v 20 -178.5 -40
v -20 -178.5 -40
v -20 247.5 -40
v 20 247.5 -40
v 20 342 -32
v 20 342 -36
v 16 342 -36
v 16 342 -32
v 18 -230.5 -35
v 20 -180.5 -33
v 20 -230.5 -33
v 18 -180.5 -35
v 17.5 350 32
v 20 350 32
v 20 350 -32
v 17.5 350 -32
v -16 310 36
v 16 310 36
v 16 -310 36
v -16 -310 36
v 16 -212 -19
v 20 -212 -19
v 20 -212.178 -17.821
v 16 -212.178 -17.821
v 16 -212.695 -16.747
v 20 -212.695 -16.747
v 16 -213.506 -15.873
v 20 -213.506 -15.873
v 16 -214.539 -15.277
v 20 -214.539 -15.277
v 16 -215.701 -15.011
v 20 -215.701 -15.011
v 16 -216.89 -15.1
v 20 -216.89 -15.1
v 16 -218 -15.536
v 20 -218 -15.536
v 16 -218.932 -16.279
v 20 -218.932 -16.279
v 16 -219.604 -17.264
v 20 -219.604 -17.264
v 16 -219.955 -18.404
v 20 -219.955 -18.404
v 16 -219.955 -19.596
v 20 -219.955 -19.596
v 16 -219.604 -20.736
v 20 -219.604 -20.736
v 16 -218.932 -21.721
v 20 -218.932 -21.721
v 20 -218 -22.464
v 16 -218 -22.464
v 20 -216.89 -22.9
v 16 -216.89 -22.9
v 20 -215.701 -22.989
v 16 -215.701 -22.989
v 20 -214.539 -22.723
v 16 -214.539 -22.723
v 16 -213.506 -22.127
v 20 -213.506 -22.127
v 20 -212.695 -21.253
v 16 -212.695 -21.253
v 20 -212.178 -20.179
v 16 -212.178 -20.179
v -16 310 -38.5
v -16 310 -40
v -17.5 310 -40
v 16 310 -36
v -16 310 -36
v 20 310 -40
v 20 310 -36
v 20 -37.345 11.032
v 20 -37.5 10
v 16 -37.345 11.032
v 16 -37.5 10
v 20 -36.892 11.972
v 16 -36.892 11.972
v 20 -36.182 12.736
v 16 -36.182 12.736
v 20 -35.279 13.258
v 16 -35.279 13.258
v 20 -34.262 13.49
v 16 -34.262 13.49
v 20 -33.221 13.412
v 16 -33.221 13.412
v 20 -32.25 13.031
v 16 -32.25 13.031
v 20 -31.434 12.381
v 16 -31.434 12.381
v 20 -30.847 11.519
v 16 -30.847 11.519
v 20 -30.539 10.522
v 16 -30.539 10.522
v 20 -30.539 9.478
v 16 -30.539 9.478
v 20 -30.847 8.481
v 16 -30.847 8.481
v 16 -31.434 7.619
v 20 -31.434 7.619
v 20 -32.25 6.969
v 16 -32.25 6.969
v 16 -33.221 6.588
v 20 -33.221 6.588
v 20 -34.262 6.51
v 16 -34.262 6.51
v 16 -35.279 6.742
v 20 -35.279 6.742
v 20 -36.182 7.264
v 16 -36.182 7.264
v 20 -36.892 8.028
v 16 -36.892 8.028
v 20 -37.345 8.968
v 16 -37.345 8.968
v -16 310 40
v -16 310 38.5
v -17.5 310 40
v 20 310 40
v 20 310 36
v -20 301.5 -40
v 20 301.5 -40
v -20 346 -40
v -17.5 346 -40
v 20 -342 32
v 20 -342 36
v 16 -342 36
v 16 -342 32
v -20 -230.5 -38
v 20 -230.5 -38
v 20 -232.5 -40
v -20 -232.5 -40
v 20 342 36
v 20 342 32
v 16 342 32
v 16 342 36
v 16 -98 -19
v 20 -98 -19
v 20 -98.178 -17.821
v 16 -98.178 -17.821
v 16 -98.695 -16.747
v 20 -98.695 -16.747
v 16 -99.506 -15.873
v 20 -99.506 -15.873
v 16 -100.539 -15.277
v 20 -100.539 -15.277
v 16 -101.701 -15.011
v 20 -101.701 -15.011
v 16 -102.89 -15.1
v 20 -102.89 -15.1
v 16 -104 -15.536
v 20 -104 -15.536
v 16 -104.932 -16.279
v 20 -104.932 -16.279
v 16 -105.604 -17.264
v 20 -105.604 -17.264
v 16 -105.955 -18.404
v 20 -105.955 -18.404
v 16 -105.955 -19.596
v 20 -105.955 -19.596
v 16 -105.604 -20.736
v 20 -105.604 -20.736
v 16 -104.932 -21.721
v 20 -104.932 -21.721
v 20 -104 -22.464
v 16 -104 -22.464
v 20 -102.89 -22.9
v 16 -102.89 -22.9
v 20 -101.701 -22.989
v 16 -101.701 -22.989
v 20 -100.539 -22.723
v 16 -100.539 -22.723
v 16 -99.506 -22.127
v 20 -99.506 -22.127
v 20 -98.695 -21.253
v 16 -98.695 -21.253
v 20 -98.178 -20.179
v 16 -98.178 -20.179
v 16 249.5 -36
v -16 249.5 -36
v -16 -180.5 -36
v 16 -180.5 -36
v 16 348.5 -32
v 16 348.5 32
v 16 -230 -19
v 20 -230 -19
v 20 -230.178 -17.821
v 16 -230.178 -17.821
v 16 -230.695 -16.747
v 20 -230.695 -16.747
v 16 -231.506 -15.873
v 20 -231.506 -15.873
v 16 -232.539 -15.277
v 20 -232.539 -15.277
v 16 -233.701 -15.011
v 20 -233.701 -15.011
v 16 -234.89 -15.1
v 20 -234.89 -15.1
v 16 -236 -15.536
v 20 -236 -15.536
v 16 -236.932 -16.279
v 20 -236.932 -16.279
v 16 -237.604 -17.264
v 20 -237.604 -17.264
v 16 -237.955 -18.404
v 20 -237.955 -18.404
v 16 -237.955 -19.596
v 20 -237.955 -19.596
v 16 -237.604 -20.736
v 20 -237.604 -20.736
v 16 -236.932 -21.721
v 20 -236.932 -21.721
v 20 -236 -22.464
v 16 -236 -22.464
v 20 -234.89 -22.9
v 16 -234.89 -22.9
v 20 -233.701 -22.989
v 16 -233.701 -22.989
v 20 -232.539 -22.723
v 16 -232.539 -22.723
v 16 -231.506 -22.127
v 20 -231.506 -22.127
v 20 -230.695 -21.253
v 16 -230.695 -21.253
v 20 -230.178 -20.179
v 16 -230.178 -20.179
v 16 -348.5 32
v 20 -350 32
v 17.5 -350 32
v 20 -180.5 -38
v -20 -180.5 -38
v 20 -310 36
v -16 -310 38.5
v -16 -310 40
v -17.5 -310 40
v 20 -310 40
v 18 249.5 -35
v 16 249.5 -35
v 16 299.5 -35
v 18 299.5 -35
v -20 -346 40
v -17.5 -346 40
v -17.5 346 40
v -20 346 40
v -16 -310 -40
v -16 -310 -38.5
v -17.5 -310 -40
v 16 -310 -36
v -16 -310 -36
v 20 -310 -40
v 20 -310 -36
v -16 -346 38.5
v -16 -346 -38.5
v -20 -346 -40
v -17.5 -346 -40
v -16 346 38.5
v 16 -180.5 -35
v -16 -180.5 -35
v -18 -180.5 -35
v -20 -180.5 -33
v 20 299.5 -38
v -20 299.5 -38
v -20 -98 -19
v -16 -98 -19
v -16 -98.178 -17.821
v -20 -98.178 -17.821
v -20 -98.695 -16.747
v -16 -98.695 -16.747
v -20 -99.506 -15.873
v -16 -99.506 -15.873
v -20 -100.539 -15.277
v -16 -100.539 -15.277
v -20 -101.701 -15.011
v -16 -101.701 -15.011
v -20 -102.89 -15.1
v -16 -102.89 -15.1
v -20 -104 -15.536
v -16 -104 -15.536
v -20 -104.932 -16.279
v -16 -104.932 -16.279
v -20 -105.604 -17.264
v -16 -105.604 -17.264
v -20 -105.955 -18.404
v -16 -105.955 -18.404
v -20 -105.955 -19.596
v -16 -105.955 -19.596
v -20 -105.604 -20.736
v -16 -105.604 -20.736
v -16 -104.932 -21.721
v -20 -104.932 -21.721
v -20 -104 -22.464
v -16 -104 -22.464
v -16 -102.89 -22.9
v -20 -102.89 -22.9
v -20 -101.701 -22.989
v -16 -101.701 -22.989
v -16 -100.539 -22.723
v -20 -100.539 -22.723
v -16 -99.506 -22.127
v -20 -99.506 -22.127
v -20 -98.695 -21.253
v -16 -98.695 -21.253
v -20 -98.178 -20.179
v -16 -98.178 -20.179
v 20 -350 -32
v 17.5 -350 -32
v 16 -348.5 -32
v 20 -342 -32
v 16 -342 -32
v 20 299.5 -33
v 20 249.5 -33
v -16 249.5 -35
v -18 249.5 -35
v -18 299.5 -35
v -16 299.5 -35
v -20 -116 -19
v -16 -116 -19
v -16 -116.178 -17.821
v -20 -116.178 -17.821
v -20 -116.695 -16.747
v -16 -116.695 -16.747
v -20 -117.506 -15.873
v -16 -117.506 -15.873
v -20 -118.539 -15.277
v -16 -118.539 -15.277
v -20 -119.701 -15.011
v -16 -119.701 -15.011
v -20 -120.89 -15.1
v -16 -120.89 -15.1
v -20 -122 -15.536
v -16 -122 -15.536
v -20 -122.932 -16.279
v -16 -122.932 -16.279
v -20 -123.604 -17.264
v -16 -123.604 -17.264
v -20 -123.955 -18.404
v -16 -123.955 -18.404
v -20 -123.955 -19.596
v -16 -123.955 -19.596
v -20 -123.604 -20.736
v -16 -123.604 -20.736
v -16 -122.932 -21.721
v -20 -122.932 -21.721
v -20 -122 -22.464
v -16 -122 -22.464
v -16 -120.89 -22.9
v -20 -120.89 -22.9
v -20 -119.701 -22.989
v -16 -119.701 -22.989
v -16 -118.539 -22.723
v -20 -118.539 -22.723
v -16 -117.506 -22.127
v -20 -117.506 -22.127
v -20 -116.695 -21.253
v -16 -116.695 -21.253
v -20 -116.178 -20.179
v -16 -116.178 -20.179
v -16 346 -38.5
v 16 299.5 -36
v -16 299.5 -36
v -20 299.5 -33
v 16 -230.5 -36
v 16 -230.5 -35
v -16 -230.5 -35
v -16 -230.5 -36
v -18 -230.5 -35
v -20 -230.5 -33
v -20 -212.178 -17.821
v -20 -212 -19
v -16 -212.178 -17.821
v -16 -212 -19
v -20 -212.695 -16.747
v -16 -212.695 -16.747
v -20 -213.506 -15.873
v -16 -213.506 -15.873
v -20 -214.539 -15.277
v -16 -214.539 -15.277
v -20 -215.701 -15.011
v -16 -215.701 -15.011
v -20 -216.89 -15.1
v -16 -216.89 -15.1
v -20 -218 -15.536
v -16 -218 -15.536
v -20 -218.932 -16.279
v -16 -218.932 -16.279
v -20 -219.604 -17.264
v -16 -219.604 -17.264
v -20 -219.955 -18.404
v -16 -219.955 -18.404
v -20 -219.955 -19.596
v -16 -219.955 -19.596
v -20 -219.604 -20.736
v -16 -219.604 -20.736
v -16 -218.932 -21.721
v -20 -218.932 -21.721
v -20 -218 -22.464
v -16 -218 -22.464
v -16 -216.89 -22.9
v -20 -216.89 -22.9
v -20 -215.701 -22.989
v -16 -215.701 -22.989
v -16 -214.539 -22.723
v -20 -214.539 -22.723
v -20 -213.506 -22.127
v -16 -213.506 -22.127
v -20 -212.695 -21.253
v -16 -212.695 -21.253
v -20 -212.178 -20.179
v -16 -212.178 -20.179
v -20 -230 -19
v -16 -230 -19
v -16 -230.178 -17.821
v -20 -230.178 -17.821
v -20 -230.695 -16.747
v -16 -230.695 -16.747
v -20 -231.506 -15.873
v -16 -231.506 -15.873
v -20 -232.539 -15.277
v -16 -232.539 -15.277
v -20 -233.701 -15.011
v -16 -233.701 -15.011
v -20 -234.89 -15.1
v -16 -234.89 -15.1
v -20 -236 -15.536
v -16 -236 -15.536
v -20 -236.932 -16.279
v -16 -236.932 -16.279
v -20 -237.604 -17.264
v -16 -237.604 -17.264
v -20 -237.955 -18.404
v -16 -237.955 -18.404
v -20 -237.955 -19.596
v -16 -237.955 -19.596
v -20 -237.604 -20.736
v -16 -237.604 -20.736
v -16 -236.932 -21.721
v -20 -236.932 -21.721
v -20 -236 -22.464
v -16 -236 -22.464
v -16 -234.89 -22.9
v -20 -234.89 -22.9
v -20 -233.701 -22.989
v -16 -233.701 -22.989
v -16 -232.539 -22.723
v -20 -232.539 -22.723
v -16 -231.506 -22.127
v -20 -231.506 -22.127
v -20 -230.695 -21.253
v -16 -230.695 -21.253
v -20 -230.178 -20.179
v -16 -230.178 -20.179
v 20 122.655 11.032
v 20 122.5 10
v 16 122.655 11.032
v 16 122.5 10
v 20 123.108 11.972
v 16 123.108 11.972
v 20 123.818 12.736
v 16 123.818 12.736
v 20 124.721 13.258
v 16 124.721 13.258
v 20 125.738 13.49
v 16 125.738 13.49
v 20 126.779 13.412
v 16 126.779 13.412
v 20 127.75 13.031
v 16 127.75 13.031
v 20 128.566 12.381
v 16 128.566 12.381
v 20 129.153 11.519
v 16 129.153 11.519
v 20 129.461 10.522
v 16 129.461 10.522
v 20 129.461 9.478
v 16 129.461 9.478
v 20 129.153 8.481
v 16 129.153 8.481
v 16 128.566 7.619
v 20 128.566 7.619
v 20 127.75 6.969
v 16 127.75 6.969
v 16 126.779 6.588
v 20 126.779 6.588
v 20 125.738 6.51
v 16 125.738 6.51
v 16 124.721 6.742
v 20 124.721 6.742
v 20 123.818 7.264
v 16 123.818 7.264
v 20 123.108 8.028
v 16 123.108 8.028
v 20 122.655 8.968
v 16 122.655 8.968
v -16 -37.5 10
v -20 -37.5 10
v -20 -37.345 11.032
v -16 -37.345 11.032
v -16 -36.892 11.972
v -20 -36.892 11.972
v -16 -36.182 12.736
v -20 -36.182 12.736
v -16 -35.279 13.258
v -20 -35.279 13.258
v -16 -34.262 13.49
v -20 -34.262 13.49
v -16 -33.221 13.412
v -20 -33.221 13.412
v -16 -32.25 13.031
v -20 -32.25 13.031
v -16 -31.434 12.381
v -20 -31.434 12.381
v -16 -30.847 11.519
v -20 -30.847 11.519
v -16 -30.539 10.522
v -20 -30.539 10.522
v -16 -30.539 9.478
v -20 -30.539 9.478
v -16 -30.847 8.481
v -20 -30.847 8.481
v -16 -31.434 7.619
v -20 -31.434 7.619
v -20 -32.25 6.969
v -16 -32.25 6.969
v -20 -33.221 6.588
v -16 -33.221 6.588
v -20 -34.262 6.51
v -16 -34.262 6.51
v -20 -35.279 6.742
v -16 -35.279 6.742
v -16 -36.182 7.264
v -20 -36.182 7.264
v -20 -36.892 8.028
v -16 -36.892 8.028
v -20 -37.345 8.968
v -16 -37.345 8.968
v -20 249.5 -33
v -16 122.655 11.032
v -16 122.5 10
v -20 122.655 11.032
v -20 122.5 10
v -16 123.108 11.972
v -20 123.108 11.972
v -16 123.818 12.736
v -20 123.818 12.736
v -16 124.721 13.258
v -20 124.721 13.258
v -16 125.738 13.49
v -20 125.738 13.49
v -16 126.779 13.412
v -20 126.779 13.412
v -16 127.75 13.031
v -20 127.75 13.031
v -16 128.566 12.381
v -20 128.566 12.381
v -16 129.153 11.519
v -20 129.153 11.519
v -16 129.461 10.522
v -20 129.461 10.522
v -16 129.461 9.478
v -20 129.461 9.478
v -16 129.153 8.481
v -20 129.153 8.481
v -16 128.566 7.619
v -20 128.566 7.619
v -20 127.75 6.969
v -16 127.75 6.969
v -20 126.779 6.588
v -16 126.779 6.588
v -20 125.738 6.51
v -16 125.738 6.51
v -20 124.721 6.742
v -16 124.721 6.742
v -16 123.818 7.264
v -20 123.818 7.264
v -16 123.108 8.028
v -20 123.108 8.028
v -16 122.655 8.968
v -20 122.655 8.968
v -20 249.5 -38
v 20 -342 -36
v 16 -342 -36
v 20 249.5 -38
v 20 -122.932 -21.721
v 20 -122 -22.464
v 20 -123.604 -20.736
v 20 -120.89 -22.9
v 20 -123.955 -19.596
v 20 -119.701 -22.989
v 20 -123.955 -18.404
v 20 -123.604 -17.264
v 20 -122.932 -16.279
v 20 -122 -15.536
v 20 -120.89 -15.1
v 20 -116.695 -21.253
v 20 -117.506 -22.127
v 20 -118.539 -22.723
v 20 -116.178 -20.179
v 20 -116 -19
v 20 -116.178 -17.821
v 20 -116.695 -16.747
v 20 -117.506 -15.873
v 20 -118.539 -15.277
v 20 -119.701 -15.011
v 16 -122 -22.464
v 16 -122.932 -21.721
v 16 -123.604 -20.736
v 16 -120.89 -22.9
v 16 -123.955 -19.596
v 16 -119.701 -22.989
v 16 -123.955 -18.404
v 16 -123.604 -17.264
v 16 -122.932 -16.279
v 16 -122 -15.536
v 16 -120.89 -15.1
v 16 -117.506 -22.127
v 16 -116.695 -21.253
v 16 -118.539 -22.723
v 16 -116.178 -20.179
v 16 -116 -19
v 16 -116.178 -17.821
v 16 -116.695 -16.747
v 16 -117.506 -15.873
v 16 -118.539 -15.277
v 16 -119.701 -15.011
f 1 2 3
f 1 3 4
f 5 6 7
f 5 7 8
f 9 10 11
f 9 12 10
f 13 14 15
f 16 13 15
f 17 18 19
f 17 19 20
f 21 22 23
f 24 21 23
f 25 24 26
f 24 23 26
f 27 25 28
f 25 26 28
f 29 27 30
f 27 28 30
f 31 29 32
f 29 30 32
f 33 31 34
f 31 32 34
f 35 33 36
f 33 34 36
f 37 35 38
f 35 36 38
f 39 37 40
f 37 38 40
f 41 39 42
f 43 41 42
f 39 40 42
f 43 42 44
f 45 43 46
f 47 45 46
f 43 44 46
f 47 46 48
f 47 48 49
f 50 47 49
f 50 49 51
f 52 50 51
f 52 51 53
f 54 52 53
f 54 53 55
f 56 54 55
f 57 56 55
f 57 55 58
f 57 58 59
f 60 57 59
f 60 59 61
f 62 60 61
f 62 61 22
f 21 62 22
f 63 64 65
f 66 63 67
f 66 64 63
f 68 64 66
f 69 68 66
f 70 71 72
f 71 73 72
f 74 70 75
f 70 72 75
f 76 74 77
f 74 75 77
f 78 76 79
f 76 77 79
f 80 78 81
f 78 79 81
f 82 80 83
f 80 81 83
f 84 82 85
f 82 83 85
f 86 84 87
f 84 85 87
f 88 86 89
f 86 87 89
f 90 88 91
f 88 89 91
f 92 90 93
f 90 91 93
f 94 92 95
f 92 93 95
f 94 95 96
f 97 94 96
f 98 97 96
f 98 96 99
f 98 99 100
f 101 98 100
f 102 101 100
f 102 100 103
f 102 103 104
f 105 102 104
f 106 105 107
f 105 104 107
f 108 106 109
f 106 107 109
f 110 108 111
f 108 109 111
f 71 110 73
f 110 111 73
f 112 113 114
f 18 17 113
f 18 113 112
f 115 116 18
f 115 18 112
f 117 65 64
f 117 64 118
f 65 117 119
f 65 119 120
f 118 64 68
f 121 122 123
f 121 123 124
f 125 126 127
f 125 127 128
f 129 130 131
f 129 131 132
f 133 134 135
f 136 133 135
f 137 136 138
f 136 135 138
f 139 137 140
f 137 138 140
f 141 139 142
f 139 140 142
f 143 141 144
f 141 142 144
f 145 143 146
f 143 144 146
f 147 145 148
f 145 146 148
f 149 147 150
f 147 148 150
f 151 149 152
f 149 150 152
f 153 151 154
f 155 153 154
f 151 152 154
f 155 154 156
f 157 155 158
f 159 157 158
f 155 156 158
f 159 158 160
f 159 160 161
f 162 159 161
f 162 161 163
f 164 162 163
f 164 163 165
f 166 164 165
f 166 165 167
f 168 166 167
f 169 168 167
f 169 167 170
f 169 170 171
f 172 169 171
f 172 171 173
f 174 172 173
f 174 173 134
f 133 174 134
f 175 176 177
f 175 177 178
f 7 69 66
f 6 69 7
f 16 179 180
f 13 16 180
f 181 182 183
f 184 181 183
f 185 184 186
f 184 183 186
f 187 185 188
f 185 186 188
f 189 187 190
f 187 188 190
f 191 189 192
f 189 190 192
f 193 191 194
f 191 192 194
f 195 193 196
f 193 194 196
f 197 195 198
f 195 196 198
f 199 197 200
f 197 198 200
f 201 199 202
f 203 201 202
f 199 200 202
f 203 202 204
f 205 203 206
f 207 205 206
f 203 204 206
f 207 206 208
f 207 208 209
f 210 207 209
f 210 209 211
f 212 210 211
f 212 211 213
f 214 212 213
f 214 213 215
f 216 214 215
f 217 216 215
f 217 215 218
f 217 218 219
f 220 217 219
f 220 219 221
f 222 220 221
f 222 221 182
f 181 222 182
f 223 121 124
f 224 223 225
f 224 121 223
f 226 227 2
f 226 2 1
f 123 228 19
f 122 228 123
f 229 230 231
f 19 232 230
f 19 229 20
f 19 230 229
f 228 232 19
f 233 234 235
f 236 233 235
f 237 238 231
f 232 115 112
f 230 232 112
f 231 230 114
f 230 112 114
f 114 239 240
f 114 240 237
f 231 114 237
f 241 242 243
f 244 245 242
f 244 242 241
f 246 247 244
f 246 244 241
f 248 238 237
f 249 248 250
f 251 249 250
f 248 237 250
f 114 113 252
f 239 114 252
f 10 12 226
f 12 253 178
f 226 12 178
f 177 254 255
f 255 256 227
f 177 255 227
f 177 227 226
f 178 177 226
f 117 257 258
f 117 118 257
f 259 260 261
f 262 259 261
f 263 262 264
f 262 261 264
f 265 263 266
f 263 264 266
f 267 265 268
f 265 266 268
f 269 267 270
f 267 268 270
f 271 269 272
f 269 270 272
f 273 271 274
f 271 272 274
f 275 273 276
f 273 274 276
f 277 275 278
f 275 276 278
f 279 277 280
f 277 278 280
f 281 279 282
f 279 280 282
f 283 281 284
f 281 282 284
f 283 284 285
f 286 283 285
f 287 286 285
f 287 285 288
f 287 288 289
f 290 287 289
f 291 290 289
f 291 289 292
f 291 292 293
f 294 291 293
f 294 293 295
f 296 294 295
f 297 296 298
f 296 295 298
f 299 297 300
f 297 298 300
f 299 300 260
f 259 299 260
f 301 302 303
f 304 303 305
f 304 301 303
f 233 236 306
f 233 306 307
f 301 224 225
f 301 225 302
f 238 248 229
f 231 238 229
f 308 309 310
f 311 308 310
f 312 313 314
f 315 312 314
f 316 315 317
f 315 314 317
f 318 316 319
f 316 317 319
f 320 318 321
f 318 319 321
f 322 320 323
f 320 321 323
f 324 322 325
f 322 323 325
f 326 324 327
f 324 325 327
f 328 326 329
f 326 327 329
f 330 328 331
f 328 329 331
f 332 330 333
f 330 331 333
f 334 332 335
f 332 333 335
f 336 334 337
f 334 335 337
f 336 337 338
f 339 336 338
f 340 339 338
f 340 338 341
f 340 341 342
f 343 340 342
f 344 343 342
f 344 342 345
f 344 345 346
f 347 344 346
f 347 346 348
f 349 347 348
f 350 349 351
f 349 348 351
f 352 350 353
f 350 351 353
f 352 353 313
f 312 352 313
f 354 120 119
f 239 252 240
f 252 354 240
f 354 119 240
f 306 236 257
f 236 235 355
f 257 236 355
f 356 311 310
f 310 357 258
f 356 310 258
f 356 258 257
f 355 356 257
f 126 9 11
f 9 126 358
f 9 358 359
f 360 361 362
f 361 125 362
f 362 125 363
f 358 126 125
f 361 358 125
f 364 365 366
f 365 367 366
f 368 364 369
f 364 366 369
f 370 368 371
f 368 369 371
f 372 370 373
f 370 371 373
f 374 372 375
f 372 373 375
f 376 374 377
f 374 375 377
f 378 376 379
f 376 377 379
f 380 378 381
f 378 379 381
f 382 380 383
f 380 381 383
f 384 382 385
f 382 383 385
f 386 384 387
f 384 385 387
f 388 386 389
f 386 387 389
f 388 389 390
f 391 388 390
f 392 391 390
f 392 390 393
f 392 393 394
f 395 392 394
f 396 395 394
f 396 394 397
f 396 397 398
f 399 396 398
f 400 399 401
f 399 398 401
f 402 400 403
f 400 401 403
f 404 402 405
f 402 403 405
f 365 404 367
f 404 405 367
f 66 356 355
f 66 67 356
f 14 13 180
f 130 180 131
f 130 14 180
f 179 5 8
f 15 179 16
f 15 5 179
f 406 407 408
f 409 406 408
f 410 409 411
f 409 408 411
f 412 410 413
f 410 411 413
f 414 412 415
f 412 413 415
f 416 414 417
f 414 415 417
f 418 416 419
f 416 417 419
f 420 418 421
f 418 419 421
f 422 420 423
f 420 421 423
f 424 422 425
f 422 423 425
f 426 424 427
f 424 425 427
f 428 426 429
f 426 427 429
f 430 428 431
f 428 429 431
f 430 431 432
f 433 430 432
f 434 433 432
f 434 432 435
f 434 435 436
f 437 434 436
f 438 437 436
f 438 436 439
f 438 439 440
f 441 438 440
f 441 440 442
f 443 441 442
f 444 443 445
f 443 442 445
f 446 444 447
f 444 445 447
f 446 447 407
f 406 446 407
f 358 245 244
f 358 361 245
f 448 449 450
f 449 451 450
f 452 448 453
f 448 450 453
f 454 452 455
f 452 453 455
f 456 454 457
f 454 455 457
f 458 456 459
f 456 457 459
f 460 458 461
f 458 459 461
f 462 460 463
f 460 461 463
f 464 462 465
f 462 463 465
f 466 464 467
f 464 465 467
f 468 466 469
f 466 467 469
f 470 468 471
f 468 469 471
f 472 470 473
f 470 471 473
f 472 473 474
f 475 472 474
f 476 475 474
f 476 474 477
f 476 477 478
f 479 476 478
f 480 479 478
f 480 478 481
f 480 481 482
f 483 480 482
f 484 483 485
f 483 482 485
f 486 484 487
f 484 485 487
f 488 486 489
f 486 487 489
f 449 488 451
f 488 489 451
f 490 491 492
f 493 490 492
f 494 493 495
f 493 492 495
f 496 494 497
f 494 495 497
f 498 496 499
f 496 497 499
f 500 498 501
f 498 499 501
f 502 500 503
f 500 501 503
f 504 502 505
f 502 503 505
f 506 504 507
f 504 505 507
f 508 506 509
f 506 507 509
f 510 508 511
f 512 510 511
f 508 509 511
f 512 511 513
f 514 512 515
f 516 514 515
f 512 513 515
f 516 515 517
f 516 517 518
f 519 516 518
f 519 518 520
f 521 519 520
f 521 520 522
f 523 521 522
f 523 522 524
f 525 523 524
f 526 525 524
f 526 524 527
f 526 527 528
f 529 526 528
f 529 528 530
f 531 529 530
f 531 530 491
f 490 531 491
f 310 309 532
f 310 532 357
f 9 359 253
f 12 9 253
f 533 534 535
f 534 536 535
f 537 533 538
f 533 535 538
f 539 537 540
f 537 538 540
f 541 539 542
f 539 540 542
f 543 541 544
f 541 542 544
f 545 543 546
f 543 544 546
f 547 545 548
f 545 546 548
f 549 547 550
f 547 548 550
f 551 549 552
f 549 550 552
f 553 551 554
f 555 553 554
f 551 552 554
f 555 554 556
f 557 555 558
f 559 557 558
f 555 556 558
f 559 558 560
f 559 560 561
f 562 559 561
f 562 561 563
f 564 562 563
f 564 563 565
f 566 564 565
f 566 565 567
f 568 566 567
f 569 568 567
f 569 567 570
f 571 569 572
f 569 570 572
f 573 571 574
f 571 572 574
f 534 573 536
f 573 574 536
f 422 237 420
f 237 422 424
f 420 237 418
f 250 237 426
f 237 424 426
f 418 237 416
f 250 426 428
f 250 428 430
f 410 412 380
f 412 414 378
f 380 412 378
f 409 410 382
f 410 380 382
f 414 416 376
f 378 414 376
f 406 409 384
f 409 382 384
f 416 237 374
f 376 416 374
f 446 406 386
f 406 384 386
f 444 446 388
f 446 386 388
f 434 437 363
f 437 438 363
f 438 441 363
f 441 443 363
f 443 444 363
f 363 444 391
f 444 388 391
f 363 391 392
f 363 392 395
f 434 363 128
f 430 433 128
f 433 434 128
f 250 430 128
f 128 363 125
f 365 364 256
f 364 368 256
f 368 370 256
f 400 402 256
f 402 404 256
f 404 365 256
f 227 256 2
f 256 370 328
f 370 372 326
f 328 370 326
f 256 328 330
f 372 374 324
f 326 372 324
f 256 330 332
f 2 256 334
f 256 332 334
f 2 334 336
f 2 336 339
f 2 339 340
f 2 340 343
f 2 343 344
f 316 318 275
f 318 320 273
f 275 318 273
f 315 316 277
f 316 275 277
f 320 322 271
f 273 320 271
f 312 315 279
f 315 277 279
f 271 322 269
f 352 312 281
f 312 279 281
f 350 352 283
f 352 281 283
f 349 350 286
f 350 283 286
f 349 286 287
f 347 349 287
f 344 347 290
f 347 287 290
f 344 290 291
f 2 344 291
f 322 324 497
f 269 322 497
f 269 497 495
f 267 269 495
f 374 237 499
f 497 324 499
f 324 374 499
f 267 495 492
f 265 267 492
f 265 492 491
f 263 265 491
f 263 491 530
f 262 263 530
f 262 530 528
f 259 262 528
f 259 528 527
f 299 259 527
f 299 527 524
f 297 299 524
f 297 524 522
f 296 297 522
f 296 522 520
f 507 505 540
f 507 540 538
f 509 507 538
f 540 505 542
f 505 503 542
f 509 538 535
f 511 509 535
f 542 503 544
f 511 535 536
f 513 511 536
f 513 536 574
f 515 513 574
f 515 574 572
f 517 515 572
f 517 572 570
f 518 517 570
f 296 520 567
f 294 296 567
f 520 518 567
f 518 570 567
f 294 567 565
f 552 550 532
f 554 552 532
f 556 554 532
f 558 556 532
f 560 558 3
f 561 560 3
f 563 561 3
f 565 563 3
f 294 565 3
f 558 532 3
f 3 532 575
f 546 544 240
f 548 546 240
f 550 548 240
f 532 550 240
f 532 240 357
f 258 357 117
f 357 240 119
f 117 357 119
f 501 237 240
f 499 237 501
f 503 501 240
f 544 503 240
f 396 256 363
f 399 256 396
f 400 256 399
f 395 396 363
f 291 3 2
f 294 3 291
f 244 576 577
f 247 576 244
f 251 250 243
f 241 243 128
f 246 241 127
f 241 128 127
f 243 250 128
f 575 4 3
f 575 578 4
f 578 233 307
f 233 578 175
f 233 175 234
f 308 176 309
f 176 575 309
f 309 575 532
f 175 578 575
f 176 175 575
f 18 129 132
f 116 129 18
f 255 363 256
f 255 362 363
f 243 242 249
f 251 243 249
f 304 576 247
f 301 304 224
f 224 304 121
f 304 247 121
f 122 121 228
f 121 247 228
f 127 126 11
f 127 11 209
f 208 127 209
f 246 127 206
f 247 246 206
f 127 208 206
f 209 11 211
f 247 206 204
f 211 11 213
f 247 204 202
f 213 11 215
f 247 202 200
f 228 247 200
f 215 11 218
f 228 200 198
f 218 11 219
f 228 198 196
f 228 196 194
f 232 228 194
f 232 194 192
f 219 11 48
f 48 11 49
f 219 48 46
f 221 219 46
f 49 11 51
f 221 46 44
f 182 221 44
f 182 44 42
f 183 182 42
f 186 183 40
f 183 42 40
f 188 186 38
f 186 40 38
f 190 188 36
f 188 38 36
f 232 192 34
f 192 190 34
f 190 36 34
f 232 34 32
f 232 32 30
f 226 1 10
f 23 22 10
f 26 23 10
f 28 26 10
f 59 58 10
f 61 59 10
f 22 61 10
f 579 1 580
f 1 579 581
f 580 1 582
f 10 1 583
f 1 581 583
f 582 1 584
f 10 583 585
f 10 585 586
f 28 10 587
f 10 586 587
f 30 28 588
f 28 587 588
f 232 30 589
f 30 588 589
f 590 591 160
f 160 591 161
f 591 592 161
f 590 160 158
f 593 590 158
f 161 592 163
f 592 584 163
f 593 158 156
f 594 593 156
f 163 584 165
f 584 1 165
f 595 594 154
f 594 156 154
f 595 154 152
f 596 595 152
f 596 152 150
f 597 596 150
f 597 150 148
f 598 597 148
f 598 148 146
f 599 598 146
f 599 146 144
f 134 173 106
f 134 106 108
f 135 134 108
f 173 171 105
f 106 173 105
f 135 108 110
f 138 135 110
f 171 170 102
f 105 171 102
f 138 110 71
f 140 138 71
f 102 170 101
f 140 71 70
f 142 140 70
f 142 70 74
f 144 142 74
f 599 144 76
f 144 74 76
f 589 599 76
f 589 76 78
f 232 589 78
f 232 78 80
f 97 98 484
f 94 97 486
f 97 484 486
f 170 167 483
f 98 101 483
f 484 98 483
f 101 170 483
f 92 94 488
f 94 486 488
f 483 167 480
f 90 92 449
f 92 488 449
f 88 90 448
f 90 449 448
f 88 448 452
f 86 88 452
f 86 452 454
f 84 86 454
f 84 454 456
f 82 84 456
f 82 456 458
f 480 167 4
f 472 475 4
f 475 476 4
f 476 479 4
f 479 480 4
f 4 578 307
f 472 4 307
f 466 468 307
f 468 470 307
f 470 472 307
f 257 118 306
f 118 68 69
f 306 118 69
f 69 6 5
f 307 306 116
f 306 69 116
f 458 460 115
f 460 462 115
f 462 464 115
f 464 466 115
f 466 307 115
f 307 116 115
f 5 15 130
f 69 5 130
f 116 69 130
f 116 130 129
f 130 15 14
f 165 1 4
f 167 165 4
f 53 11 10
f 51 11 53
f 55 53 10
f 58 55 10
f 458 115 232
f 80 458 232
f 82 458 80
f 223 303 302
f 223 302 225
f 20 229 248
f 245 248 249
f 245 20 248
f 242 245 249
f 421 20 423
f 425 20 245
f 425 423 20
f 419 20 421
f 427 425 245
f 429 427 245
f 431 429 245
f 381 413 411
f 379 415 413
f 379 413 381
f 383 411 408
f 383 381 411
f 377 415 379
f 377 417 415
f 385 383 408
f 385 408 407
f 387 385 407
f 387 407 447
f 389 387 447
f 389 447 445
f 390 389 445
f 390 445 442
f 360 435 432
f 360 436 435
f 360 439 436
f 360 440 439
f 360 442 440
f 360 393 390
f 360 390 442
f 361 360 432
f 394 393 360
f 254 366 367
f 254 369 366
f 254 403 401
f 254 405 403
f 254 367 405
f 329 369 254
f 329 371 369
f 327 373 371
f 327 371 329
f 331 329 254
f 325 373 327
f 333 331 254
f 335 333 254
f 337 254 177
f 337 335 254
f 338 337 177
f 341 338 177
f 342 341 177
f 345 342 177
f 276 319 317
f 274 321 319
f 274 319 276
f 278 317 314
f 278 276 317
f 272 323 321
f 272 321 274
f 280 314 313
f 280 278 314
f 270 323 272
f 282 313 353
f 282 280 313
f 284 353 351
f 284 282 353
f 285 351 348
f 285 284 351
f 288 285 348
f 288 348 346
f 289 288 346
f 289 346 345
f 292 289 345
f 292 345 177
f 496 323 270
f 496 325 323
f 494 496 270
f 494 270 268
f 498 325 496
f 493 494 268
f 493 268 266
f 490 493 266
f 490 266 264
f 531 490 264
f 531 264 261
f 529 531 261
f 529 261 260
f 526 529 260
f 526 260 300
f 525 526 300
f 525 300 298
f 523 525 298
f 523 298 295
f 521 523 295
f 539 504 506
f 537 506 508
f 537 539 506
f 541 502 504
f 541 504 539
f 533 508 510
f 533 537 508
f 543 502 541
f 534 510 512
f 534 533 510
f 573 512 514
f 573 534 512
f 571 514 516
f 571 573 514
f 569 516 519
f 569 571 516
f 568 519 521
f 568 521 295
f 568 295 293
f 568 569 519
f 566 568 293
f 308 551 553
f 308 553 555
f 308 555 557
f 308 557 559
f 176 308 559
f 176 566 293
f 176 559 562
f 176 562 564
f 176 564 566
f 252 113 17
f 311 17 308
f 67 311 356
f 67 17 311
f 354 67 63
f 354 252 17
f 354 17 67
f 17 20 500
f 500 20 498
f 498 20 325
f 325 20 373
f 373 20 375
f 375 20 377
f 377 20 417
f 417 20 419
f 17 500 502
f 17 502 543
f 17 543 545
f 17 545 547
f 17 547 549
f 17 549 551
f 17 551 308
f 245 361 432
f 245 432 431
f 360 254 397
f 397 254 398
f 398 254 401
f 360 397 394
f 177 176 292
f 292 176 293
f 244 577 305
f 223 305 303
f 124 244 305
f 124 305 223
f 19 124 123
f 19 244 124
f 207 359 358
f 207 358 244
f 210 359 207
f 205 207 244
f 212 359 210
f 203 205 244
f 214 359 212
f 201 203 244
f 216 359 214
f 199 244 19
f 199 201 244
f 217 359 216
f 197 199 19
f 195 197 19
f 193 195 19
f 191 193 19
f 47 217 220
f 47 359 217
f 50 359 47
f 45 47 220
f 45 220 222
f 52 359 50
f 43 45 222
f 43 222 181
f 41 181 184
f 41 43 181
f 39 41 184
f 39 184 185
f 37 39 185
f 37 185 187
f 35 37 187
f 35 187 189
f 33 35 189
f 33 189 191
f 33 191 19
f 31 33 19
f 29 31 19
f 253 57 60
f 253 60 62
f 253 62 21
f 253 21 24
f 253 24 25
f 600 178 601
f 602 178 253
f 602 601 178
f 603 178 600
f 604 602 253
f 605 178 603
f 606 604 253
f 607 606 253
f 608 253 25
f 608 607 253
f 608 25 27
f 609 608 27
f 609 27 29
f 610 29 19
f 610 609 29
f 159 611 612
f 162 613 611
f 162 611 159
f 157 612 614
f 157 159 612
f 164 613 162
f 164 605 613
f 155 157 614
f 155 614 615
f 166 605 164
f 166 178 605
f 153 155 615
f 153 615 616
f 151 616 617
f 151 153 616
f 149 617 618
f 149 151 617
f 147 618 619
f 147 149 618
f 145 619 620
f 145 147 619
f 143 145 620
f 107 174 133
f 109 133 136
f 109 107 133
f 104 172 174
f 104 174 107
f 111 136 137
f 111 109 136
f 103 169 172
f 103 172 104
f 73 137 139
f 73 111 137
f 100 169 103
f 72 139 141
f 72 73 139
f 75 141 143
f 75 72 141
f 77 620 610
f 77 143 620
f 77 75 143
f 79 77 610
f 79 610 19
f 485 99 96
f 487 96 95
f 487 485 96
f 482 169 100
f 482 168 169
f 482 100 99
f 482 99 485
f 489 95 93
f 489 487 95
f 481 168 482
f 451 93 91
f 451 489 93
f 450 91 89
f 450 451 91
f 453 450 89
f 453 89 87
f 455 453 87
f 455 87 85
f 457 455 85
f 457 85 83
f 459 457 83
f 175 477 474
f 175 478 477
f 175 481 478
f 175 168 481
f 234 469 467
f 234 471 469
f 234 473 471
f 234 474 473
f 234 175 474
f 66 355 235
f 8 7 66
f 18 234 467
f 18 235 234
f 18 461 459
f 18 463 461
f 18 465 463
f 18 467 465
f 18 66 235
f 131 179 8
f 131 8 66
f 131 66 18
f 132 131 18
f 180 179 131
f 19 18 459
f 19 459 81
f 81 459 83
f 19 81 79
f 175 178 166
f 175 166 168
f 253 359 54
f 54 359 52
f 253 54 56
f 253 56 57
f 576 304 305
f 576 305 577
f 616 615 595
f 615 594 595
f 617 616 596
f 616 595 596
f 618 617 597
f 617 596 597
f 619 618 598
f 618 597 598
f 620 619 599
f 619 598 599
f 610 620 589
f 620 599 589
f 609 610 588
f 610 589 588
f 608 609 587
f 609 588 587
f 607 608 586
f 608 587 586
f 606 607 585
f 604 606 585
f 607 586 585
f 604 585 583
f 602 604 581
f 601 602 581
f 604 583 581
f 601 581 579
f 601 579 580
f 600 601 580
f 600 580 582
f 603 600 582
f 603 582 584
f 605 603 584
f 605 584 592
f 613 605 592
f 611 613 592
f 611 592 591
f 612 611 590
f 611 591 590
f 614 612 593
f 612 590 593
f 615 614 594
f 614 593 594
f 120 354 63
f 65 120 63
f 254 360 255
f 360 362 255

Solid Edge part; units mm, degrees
sketch "Sketch1" plane through (0, 0, 0) normal (0, -1, 0) x (1, 0, 0)
  line L0 (-16, -36) -> (16, -36)
  line L1 (16, -36) -> (16, 36)
  line L2 (16, 36) -> (-16, 36)
  line L3 (-16, 36) -> (-16, -36)
  line L4 (-20, -40) -> (20, -40)
  line L5 (20, -40) -> (20, 40)
  line L6 (20, 40) -> (-20, 40)
  line L7 (-20, 40) -> (-20, -40)
  dimension "D1" = 40
  dimension "D2" = 4
  dimension "D3" = 80
  dimension "D4" = 4
extrude "Protrusion1" add sketch "Sketch1" along normal mid plane 700
sketch "Sketch2" plane through (-20, 0, 0) normal (-1, 0, 0) x (0, -1, 0)
  line L0 (180.5, -40) -> (230.5, -40)
  line L1 (230.5, -40) -> (230.5, -35)
  line L2 (230.5, -35) -> (180.5, -35)
  line L3 (180.5, -35) -> (180.5, -40)
  line L4 (-299.5, -40) -> (-249.5, -40)
  line L5 (-249.5, -40) -> (-249.5, -35)
  line L6 (-249.5, -35) -> (-299.5, -35)
  line L7 (-299.5, -35) -> (-299.5, -40)
  dimension "D1" = 50
  dimension "D2" = 5
  dimension "D3" = 75.5
  dimension "D4" = 50
  dimension "D5" = 5
  dimension "D6" = 144.5
extrude "Cutout1" cut sketch "Sketch2" against normal through all
chamfer "Chamfer1" distance 2 angle 45 2 edges at (0, -230.5, -40) (0, -180.5, -40)
chamfer "Fase_5" distance 2 angle 45 2 edges at (0, 249.5, -40) (0, 299.5, -40)
chamfer "Fase_6" distance 2 angle 45 2 edges at (20, 274.5, -35) (-20, 274.5, -35)
chamfer "Fase_7" distance 2 angle 45 2 edges at (20, -205.5, -35) (-20, -205.5, -35)
sketch "Sketch3" plane through (20, 0, 0) normal (1, 0, 0) x (0, 1, 0)
  circle A0 centre (-216, -19) radius 4
  circle A1 centre (-120, -19) radius 4
  circle A2 centre (-102, -19) radius 4
  circle A3 centre (-234, -19) radius 4
  dimension "D1" = 18
  dimension "D2" = 18
  dimension "D3" = 8
  dimension "D4" = 96
  dimension "D5" = 59
  dimension "D6" = 116
extrude "Cutout2" cut sketch "Sketch3" against normal through all
sketch "Sketch4" plane through (-20, 0, 0) normal (-1, 0, 0) x (0, -1, 0)
  circle A0 centre (-126, 10) radius 3.5
  circle A1 centre (34, 10) radius 3.5
  dimension "D1" = 7
  dimension "D2" = 160
  dimension "D3" = 30
  dimension "D4" = 224
extrude "Cutout3" cut sketch "Sketch4" against normal through all
sketch "Sketch5" plane through (-20, -2, 0) normal (-1, 0, 0) x (0, -1, 0)
  line L0 (348, 40) -> (344, 40)
  line L1 (344, 40) -> (344, -40)
  line L2 (344, -40) -> (348, -40)
  line L3 (348, -40) -> (348, 40)
  dimension "D1" = 4
extrude "Cutout4" cut sketch "Sketch5" against normal up to vertex (36 mm away)
sketch "Sketch6" plane through (20, 0, 0) normal (1, 0, 0) x (0, 1, 0)
  line L0 (-350, 40) -> (-310, 40)
  line L1 (-310, 40) -> (-310, 36)
  line L2 (-310, 36) -> (-342, 36)
  line L3 (-342, 36) -> (-342, 32)
  line L4 (-342, 32) -> (-350, 32)
  line L5 (-350, 32) -> (-350, 40)
  dimension "D1" = 4
  dimension "D2" = 40
  dimension "D3" = 32
  dimension "D4" = 4
extrude "Cutout5" cut sketch "Sketch6" against normal blind 36
mirror "Mirror1" about plane through (0, 0, 0) normal (0, 0, 1) of "Cutout5"
mirror "Mirror2" about plane through (0, 0, 0) normal (0, -1, 0) of "Cutout4", "Cutout5", "Mirror1"
chamfer "Fase_11" distance 1.5 angle 45 4 edges at (-16, -328, 40) (-16, -328, -40) (-16, 328, 40) (-16, 328, -40)
chamfer "Fase_13" distance 1.5 angle 45 2 edges at (16, -350, 0) (16, 350, 0)
properties material "Aluminium, 6061-T6"
